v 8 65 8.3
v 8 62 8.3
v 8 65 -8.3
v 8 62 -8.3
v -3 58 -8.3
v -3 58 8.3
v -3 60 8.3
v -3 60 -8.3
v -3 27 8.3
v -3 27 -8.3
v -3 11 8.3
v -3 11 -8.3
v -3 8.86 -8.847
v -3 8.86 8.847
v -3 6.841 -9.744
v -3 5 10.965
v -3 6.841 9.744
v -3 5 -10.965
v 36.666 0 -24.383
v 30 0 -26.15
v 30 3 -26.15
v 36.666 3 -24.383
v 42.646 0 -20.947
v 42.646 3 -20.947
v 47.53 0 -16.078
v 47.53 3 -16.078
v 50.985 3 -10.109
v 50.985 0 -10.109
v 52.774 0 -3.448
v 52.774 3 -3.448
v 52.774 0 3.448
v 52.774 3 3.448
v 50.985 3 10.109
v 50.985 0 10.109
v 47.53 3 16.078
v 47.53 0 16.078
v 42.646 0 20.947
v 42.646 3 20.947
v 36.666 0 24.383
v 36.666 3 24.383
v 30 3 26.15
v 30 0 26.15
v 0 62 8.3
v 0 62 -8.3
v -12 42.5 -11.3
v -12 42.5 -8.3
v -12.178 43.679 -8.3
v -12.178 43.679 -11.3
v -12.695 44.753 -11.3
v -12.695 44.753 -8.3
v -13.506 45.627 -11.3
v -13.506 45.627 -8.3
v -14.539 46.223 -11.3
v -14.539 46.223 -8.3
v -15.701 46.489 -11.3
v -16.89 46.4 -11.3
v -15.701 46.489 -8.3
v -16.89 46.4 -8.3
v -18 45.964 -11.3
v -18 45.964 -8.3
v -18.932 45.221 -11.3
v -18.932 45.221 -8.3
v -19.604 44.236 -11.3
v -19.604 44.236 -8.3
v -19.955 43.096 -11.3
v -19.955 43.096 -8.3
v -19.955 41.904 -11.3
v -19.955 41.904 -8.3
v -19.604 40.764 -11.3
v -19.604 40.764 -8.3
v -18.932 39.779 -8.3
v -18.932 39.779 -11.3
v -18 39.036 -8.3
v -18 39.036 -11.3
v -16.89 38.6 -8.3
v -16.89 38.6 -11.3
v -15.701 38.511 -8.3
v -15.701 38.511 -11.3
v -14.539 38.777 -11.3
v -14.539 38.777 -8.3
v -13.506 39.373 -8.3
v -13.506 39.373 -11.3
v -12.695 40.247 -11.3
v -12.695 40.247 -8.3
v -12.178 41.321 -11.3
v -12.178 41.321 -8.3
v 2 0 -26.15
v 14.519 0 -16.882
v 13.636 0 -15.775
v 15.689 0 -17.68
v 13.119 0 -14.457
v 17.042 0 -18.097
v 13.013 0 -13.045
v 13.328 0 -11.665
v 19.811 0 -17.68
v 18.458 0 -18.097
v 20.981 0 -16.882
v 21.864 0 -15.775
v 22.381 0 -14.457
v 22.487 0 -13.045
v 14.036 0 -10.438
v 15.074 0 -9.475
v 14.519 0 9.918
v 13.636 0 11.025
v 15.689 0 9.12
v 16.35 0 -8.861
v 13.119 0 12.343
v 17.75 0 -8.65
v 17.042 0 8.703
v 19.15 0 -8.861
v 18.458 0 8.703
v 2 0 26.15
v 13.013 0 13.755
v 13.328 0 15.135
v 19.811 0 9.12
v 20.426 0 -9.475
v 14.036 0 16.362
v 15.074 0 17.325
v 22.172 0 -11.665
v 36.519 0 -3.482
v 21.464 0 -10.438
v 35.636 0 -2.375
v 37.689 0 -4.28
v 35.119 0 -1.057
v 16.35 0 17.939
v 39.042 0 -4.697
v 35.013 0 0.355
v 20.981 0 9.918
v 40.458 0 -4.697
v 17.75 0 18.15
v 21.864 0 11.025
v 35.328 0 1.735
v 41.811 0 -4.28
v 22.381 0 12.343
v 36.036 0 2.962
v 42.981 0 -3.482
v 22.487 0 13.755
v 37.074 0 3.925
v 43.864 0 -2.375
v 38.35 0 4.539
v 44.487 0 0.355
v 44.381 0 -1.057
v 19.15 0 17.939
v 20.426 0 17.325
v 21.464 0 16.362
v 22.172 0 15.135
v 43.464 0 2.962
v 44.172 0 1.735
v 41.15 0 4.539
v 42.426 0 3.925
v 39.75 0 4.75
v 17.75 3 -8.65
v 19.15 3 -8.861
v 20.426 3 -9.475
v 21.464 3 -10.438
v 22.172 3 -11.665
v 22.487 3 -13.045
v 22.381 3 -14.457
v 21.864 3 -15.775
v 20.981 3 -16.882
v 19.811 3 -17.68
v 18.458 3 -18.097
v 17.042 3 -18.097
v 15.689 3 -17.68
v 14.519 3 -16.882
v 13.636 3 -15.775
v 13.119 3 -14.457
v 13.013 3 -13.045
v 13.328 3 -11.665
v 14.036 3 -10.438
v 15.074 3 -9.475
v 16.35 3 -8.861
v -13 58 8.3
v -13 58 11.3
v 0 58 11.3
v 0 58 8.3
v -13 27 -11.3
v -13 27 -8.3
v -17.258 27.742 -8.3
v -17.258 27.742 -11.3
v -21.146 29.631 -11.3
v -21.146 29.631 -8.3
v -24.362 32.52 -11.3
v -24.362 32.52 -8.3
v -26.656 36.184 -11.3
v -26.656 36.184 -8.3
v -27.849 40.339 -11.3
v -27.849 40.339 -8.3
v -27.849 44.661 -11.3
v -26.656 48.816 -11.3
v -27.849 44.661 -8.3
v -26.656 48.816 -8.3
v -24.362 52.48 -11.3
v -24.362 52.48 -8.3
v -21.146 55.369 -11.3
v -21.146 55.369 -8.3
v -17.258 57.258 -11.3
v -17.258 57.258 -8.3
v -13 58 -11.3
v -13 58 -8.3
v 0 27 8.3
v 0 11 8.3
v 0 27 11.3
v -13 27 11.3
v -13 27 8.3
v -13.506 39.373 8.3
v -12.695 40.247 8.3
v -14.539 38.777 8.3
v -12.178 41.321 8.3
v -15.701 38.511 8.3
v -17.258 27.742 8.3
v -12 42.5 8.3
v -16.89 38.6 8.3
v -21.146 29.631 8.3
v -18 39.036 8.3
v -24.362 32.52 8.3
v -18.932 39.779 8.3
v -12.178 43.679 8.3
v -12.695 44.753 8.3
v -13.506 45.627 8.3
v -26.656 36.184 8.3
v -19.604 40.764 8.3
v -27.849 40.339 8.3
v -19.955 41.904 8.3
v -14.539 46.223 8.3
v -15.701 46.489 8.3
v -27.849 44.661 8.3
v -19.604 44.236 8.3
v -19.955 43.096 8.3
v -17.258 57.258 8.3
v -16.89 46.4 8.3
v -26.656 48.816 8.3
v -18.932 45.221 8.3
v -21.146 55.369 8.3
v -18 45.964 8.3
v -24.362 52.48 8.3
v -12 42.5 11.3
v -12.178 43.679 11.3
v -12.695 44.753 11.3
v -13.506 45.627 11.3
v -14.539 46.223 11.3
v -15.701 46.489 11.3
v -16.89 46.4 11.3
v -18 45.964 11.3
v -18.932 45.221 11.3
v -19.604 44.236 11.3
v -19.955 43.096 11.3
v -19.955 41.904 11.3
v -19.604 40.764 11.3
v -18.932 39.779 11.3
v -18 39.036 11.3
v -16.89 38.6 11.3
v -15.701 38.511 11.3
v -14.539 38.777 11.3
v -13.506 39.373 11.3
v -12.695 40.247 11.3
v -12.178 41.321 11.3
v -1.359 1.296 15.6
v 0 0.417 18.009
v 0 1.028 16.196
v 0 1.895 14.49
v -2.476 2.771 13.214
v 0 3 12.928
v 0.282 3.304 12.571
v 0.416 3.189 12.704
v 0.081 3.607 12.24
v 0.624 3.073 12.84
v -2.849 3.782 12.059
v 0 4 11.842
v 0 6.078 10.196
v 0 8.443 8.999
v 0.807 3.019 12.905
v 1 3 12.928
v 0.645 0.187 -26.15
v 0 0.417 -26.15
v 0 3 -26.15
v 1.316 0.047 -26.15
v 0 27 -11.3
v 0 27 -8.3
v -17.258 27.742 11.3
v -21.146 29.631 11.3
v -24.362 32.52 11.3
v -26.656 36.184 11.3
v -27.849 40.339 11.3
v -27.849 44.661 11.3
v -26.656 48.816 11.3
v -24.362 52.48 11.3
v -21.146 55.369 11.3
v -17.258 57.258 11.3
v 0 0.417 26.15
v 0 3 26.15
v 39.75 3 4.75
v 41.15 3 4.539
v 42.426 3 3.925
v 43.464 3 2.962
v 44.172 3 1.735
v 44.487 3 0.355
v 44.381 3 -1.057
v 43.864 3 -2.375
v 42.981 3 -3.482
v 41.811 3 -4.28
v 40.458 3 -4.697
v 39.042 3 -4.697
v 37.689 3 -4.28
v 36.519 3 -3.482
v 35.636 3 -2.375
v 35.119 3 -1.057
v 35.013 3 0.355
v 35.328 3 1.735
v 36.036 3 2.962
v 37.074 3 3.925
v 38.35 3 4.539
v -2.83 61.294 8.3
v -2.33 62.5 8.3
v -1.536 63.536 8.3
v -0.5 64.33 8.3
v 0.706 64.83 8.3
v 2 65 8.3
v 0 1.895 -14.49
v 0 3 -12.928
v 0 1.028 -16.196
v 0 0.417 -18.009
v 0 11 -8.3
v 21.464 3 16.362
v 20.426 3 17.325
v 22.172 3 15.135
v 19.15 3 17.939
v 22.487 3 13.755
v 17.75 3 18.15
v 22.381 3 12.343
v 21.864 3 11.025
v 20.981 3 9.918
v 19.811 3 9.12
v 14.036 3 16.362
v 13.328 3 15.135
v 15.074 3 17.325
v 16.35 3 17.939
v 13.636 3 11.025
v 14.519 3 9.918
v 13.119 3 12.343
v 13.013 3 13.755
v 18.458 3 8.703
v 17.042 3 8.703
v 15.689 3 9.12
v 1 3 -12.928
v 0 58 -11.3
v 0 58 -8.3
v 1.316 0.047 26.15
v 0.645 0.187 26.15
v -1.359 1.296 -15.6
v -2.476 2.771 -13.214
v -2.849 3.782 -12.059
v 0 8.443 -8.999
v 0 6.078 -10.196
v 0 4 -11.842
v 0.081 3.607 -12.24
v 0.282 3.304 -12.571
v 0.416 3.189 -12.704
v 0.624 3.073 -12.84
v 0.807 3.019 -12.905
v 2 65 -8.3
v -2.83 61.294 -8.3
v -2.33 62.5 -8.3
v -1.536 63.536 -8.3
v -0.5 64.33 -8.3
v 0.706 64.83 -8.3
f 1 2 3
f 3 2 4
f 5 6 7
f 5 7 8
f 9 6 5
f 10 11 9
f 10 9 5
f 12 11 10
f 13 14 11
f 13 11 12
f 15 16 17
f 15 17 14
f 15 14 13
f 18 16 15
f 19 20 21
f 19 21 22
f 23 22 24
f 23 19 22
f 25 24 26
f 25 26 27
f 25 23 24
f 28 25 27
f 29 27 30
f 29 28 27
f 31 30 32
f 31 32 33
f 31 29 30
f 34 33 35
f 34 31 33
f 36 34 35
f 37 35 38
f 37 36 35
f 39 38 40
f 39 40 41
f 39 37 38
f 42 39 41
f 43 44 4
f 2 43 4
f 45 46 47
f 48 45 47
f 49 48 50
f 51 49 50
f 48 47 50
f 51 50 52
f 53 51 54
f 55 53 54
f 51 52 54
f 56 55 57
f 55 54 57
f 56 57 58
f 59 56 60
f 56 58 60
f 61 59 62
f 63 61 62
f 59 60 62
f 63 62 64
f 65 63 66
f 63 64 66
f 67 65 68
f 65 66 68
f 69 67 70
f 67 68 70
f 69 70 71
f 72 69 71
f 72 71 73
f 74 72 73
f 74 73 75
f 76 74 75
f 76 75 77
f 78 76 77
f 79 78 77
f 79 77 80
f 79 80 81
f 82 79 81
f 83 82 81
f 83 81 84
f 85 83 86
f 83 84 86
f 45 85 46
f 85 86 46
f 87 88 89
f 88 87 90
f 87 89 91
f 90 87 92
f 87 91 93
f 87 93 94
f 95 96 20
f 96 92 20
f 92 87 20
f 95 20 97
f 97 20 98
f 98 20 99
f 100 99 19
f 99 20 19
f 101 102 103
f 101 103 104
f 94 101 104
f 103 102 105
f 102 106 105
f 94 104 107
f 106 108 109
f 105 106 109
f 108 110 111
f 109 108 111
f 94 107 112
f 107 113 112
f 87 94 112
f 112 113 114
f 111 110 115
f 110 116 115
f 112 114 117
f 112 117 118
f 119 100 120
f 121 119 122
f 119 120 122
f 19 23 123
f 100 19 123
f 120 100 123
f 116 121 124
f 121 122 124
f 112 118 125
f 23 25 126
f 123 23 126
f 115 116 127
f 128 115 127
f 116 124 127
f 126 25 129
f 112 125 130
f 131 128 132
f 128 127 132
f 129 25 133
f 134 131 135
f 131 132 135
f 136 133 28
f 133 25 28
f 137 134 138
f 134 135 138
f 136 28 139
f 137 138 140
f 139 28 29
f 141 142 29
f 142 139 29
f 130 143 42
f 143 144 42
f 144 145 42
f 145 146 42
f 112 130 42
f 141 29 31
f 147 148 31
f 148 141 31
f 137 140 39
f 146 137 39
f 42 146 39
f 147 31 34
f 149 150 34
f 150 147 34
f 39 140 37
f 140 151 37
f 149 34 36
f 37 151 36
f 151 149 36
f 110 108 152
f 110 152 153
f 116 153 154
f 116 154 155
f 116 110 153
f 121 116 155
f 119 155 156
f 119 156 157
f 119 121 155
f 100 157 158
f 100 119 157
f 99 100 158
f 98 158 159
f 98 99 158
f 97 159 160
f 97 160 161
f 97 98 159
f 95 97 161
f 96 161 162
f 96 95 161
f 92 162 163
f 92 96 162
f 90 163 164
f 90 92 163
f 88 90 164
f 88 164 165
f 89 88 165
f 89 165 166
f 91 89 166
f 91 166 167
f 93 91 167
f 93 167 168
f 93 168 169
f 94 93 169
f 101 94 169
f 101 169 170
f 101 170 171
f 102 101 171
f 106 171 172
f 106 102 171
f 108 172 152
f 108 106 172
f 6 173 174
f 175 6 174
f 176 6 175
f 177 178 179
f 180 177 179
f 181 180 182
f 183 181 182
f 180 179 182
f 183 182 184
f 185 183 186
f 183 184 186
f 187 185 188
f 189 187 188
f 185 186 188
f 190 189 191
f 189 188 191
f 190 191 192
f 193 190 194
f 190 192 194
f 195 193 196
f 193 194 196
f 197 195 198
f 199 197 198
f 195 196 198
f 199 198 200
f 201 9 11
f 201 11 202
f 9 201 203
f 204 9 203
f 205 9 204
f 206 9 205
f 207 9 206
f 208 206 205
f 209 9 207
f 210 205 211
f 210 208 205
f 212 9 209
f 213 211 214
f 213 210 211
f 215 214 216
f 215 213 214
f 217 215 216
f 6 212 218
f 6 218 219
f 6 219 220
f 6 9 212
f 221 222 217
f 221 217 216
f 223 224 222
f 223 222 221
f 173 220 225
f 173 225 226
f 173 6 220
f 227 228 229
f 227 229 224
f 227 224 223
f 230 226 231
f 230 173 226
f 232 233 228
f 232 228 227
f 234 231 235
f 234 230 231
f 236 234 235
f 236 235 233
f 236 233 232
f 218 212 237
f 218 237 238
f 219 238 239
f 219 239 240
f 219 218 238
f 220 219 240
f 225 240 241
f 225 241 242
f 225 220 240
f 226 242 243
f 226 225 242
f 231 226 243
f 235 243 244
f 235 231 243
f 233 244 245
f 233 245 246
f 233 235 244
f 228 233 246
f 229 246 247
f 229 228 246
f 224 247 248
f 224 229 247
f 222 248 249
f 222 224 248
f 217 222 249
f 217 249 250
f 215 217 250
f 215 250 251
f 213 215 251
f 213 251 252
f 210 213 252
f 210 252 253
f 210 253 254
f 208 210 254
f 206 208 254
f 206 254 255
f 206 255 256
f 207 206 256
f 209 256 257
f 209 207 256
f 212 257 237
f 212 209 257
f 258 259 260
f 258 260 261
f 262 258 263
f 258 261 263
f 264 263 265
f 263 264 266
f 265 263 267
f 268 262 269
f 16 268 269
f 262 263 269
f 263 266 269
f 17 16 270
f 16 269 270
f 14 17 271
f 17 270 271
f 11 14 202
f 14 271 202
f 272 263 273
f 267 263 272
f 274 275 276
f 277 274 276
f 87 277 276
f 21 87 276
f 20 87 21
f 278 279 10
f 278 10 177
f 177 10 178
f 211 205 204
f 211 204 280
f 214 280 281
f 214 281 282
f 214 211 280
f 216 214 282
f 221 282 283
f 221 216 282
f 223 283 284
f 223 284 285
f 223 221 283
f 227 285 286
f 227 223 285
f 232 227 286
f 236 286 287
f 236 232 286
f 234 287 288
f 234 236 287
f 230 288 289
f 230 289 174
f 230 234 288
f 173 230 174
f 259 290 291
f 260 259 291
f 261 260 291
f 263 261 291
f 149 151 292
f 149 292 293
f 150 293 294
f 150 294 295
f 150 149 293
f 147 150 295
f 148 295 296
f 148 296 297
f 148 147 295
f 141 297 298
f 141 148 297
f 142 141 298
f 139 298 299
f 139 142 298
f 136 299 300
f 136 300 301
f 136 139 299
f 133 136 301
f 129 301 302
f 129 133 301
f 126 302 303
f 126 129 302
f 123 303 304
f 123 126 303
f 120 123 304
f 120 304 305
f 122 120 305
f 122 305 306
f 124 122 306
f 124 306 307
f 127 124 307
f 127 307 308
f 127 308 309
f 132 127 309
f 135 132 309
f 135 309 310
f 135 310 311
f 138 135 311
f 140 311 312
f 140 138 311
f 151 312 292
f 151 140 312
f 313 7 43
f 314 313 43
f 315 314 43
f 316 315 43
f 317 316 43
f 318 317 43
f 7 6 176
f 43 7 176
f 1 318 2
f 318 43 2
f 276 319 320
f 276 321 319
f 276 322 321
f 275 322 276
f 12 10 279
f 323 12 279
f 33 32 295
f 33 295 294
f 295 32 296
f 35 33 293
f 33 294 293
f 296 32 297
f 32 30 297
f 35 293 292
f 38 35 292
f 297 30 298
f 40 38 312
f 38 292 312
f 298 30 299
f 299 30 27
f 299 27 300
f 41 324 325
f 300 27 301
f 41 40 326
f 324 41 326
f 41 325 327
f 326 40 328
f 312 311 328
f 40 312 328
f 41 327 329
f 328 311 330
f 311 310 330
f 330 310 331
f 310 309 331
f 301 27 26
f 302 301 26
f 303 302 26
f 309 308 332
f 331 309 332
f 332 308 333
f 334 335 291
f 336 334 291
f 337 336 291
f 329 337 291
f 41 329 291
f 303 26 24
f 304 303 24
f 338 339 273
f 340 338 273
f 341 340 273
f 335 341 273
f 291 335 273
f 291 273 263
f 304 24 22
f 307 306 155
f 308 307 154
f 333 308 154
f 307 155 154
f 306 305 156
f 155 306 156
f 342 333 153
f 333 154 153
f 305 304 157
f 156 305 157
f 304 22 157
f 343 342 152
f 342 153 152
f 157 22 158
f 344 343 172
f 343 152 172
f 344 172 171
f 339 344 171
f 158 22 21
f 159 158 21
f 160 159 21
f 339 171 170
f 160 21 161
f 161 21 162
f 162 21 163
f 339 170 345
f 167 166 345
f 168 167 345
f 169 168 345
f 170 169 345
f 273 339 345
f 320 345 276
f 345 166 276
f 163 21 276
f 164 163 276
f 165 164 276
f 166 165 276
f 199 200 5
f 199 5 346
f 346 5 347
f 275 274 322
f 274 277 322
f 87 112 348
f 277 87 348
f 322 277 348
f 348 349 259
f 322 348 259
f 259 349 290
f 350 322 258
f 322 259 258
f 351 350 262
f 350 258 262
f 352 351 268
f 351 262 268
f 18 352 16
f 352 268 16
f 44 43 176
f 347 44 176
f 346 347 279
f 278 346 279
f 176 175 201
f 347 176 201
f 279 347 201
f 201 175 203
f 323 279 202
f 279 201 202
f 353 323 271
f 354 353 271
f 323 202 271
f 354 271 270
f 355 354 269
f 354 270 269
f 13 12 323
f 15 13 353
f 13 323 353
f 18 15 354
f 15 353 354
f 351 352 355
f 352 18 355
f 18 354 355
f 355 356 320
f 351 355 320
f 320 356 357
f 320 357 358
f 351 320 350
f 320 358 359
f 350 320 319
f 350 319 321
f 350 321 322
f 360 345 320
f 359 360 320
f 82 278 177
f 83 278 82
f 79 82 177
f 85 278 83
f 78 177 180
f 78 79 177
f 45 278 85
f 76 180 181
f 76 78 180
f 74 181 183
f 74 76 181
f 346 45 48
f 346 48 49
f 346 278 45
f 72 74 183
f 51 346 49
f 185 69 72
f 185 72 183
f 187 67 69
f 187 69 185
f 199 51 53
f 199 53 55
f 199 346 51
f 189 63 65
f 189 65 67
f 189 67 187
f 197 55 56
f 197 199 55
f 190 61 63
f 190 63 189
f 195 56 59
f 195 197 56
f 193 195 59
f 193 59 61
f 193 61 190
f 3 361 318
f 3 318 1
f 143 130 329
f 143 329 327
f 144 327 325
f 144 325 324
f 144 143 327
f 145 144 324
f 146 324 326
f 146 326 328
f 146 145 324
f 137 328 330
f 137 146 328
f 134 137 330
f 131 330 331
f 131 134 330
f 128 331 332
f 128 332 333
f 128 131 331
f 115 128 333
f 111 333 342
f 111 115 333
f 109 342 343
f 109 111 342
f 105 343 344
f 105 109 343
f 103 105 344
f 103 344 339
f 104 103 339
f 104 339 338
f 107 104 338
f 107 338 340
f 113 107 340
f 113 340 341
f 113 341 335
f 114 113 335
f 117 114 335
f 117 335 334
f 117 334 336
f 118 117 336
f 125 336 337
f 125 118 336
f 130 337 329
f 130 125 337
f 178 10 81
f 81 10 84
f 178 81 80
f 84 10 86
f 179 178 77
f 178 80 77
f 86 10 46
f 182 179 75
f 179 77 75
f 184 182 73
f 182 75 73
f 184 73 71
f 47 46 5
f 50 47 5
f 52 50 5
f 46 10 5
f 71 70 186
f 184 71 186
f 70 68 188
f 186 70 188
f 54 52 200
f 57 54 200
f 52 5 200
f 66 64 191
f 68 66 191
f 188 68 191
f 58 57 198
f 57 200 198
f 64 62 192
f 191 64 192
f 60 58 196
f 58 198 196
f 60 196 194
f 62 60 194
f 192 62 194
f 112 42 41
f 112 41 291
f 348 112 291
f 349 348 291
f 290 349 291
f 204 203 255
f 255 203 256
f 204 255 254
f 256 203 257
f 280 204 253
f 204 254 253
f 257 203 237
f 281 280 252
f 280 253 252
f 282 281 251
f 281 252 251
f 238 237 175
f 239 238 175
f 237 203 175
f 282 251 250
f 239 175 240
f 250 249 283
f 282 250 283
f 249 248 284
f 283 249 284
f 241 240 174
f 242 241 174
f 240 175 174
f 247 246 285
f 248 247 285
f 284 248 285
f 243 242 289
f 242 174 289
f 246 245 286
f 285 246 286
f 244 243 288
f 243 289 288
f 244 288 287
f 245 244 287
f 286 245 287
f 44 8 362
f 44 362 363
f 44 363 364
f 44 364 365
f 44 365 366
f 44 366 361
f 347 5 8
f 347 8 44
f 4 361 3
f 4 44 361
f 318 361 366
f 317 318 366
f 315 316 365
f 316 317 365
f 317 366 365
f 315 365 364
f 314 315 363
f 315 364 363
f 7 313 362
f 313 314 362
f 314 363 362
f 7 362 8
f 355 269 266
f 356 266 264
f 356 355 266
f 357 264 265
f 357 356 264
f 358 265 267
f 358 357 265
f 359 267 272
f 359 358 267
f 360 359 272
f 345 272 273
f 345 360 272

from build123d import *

# Parameters (mm, degrees)
SKETCH1_R           = 4.75
BOSS_EXTRUDE1_DEPTH = 3
BOSS_EXTRUDE3_DEPTH = 3
SKETCH4_W           = 11
SKETCH4_H           = 16.6
BOSS_EXTRUDE4_DEPTH = 3
SKETCH5_R           = 4
BOSS_EXTRUDE5_DEPTH = 3
FILLET6_R           = 5
FILLET7_R           = 1


with BuildPart() as part:
    # Sketch1 → Boss-Extrude1 (new body)
    with BuildSketch(Plane(origin=(0, 0, 0), x_dir=(1, 0, 0), z_dir=(0, 1, 0))):
        with BuildLine():
            Line((0, 26.15), (30, 26.15))
            ThreePointArc((30, 26.15), (53, 0), (30, -26.15))
            Line((30, -26.15), (0, -26.15))
            Line((0, -26.15), (0, 26.15))
        make_face()
        with Locations(Location((17.75, 13.4, 0), (0, 0, 270))):
            Circle(SKETCH1_R, mode=Mode.SUBTRACT)
        with Locations(Location((17.75, -13.4, 0), (0, 0, 270))):
            Circle(SKETCH1_R, mode=Mode.SUBTRACT)
        with Locations(Location((39.75, 0, 0), (0, 0, 270))):
            Circle(SKETCH1_R, mode=Mode.SUBTRACT)
    extrude(amount=BOSS_EXTRUDE1_DEPTH)

    # Sketch3 → Boss-Extrude3 (add)
    with BuildSketch(Plane.ZY):
        with BuildLine():
            Line((-8.3, 0), (8.3, 0))
            Line((8.3, 0), (21.3, 0))
            ThreePointArc((21.3, 0), (12.785306817, 3.118998966), (8.3, 11))
            Line((8.3, 11), (8.3, 62))
            Line((8.3, 62), (-8.3, 62))
            Line((-8.3, 62), (-8.3, 11))
            ThreePointArc((-8.3, 11), (-12.785306817, 3.118998966), (-21.3, 0))
            Line((-21.3, 0), (-8.3, 0))
        make_face()
    extrude(amount=BOSS_EXTRUDE3_DEPTH)

    # Sketch4 → Boss-Extrude4 (add)
    with BuildSketch(Plane(origin=(0, 62, 0), x_dir=(1, 0, 0), z_dir=(0, 1, 0))):
        with Locations((2.5, 0)):
            Rectangle(SKETCH4_W, SKETCH4_H)
    extrude(amount=BOSS_EXTRUDE4_DEPTH)

    # Sketch5 → Boss-Extrude5 (add)
    with BuildSketch(Plane.XY.offset(8.3)):
        with BuildLine():
            Line((0, 58), (0, 27))
            Line((0, 27), (-13, 27))
            ThreePointArc((-13, 27), (-28, 42.5), (-13, 58))
            Line((-13, 58), (0, 58))
        make_face()
        with Locations((-16, 42.5)):
            Circle(SKETCH5_R, mode=Mode.SUBTRACT)
    boss_extrude5 = extrude(amount=BOSS_EXTRUDE5_DEPTH)

    # Mirror1: Boss-Extrude5 across plane
    add(boss_extrude5.mirror(Plane.XY))

    # Fillet6
    # the kernel refuses this fillet: 5 mm, written as the material it takes off along each edge
    with BuildSketch(Plane(origin=(-3, 65, -20.8), x_dir=(0, -1, 0), z_dir=(0, 0, 1))) as fillet6_piece_1:
        with BuildLine():
            CenterArc((FILLET6_R, FILLET6_R), FILLET6_R, 180, 90)
            Line((0, FILLET6_R), (0, 0))
            Line((0, 0), (FILLET6_R, 0))
        make_face()
    extrude(amount=41.6, mode=Mode.SUBTRACT)
    with BuildSketch(Plane(origin=(-3, 0, 33.8), x_dir=(1, 0, 0), z_dir=(0, 0, -1))) as fillet6_piece_2:
        with BuildLine():
            CenterArc((FILLET6_R, -FILLET6_R), FILLET6_R, 90, 90)
            Line((0, -FILLET6_R), (0, 0))
            Line((0, 0), (FILLET6_R, 0))
        make_face()
    extrude(amount=67.6, mode=Mode.SUBTRACT)

    # Fillet7
    fillet7_edges = [part.edges().sort_by_distance(p)[0] for p in [
        (0, 3, 0),
    ]]
    fillet(fillet7_edges, radius=FILLET7_R)


solid = part.part
